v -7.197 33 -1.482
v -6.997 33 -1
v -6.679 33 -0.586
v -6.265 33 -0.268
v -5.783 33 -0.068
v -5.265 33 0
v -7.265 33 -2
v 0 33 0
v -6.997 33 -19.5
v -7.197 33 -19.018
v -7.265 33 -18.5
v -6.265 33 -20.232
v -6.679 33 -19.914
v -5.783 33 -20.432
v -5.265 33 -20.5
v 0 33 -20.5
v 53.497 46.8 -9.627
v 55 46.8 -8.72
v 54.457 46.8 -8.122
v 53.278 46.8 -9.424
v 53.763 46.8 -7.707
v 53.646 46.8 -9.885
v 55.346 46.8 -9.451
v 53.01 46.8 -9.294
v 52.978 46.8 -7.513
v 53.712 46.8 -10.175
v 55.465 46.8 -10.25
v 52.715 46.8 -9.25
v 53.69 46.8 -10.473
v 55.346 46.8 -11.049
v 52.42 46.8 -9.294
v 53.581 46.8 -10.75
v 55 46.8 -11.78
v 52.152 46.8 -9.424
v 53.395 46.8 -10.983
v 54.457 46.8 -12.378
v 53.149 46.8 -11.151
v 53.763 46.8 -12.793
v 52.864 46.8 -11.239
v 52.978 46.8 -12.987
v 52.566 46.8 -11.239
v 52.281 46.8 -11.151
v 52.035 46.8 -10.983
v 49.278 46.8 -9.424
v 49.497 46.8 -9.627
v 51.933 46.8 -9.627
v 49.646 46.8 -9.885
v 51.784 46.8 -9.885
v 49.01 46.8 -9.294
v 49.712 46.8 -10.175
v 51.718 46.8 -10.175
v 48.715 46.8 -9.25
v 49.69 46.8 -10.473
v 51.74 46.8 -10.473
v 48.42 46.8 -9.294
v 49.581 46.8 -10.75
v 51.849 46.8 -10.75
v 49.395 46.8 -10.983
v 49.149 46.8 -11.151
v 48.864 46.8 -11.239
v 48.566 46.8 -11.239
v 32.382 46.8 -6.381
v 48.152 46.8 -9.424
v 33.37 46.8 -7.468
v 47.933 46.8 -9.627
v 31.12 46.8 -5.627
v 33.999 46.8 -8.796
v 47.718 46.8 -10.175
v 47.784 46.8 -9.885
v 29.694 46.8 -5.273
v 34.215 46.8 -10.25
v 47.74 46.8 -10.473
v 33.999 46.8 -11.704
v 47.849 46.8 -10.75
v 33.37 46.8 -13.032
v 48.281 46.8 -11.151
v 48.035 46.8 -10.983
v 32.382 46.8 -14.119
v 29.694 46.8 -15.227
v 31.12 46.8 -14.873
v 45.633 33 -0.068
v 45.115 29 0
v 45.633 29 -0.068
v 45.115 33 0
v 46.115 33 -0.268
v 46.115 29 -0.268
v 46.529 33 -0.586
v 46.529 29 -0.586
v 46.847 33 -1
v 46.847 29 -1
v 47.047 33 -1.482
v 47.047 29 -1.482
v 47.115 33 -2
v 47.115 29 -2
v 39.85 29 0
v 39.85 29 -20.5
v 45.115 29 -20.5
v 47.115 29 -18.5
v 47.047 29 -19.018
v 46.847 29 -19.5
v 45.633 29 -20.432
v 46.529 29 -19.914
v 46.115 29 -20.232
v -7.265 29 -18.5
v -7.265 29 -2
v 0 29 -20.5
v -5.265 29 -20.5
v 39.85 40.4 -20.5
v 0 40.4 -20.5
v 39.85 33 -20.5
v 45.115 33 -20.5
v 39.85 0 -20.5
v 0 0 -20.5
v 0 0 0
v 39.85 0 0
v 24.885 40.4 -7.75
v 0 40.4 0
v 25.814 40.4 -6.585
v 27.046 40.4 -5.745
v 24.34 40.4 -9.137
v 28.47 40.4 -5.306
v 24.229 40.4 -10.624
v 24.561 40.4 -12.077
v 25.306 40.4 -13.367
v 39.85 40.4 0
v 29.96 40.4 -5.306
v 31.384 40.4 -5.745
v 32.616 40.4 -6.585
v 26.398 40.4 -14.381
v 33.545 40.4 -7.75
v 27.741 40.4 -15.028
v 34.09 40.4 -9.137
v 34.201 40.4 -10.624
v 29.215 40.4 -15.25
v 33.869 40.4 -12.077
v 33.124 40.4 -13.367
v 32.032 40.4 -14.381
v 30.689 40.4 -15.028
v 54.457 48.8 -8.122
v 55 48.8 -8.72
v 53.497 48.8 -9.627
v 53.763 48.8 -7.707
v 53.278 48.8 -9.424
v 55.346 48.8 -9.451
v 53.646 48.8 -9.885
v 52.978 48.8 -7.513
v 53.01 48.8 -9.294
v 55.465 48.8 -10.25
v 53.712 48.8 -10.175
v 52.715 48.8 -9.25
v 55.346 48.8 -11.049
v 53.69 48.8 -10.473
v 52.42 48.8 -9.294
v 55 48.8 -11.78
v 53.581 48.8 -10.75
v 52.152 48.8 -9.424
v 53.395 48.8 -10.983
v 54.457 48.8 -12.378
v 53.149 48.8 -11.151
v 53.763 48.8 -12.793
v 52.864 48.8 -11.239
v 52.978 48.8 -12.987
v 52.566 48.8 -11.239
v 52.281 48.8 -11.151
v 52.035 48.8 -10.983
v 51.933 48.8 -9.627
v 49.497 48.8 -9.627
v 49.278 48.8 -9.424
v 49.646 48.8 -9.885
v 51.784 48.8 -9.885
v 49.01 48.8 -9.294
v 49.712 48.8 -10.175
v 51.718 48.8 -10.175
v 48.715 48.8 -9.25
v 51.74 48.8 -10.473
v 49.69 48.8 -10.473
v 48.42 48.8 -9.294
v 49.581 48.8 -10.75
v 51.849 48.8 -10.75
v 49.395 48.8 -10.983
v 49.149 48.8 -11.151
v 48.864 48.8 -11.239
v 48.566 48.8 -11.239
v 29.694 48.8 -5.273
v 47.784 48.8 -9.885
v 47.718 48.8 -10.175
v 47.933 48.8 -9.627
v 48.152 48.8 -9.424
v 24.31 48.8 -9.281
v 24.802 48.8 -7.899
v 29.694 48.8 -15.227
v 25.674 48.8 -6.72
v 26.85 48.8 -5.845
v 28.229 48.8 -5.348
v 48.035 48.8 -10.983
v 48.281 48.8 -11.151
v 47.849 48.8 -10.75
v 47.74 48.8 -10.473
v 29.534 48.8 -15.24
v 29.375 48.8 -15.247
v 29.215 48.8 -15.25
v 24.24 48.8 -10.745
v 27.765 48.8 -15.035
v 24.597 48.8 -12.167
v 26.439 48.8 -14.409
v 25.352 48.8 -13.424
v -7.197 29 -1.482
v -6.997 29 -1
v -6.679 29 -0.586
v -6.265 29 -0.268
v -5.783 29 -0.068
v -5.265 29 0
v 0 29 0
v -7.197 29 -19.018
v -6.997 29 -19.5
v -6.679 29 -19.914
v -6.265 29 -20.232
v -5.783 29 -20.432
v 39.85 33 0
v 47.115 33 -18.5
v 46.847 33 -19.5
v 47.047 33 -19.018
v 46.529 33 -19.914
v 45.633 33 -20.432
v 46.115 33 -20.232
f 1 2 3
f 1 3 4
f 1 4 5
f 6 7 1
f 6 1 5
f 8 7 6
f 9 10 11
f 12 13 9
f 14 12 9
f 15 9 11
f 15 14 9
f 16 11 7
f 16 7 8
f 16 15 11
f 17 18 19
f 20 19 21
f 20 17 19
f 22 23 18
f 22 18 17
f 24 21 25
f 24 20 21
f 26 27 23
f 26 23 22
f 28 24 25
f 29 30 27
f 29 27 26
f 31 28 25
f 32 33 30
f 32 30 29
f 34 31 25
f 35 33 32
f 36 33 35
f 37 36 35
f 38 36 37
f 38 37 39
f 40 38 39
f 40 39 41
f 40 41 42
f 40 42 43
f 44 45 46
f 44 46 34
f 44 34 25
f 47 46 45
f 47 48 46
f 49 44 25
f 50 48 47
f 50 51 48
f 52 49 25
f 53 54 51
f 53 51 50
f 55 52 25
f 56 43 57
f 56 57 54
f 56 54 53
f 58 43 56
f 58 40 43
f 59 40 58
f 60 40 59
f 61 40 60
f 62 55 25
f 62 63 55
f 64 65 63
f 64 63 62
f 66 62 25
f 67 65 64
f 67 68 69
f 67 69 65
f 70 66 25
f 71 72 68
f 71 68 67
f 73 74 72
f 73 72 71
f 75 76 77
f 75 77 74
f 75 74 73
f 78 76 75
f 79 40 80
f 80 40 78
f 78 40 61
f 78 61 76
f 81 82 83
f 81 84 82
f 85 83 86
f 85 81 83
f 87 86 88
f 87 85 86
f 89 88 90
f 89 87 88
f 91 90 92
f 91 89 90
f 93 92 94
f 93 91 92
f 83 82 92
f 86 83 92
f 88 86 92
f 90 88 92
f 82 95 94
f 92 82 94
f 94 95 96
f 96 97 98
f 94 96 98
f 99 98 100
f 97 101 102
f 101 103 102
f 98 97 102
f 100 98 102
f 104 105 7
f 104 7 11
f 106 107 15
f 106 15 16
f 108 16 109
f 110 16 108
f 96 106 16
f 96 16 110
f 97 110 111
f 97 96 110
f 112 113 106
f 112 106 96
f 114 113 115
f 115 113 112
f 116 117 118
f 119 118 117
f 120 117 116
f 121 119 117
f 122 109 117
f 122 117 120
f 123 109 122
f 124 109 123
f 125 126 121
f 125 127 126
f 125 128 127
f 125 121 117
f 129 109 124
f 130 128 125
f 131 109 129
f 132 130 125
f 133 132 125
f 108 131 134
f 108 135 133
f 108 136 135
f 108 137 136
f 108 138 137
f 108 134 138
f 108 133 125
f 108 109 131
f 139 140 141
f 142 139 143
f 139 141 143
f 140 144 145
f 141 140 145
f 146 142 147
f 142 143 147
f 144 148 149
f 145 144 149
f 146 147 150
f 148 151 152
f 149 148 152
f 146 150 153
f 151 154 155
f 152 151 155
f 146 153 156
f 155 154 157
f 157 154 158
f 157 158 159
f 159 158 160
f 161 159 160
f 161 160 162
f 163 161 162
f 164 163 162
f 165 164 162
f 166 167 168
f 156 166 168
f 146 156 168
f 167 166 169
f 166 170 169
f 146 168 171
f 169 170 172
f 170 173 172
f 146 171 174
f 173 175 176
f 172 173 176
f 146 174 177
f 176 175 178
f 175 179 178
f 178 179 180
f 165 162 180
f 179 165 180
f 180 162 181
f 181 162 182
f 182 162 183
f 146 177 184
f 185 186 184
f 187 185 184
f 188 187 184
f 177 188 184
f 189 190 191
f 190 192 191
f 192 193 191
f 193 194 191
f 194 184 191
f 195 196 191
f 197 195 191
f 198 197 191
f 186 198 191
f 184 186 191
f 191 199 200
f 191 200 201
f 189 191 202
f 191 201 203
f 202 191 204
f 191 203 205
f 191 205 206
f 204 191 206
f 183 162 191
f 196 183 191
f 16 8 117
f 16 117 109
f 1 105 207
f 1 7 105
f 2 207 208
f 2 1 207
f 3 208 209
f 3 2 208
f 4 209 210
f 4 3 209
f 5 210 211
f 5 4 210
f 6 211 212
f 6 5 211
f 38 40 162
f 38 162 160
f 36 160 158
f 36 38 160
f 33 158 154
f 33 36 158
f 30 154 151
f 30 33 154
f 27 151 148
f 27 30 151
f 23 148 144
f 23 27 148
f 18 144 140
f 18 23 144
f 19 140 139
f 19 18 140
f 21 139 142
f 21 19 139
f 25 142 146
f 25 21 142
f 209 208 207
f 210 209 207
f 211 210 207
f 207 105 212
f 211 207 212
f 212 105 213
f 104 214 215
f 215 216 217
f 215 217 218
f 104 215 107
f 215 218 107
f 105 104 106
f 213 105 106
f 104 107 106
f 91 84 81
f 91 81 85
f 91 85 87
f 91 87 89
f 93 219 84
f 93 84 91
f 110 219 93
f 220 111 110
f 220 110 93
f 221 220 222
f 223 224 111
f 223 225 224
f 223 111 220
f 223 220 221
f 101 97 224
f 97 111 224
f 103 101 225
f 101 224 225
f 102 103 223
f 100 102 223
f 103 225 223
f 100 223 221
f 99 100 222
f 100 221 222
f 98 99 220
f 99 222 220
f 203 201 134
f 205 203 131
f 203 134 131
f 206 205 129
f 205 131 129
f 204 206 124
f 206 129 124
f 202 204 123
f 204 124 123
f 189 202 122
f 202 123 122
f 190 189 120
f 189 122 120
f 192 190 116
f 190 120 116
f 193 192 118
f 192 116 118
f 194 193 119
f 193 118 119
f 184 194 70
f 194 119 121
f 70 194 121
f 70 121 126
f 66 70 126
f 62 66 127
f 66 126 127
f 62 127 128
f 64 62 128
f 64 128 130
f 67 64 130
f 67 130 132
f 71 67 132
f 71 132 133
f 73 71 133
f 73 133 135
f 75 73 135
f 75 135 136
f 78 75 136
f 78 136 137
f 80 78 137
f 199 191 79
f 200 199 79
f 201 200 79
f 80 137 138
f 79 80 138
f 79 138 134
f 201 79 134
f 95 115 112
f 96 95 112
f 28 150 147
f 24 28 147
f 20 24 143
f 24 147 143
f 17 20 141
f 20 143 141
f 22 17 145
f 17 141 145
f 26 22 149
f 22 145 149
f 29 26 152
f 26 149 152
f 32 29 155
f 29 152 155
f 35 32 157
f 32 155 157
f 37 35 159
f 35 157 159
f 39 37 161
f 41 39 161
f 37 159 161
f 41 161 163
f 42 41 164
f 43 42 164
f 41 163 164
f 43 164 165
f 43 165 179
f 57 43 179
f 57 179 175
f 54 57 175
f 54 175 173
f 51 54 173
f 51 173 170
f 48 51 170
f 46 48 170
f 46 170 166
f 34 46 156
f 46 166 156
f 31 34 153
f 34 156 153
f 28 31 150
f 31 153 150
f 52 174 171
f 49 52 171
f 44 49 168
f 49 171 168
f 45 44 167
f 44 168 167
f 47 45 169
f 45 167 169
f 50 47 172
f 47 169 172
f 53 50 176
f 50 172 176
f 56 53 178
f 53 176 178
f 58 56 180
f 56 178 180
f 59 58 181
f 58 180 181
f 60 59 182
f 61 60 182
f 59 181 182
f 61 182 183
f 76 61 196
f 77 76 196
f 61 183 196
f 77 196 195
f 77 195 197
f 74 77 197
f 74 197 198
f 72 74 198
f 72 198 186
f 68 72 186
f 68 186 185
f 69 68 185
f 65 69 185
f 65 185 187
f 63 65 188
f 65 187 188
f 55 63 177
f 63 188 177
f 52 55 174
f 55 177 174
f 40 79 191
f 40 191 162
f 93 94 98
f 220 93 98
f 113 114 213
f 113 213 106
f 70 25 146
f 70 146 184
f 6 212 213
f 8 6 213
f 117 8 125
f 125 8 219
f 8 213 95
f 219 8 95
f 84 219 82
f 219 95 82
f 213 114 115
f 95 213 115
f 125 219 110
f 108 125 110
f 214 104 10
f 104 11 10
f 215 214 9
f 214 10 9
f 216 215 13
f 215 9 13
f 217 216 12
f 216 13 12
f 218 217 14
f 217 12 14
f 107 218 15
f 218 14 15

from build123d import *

# Parameters (mm, degrees)
SKETCH2_W           = 39.85
SKETCH2_H           = 20.5
BOSS_EXTRUDE1_DEPTH = 40.4
BOSS_EXTRUDE2_START = 29
SKETCH3_W           = 54.38
SKETCH3_H           = 20.5
BOSS_EXTRUDE2_DEPTH = 4
FILLET1_R           = 2
SKETCH5_R           = 5
BOSS_EXTRUDE3_DEPTH = 8.4
BOSS_EXTRUDE4_START = -2
BOSS_EXTRUDE4_DEPTH = 2
SKETCH7_R           = 1
CUT_EXTRUDE1_DEPTH  = 2


with BuildPart() as part:
    # Sketch2 → Boss-Extrude1 (new body)
    with BuildSketch(Plane(origin=(0, 0, 0), x_dir=(1, 0, 0), z_dir=(0, 1, 0))):
        with Locations((19.925, 10.25)):
            Rectangle(SKETCH2_W, SKETCH2_H)
    extrude(amount=BOSS_EXTRUDE1_DEPTH)

    # Sketch3 → Boss-Extrude2 (add)
    with BuildSketch(Plane(origin=(0, 0, 0), x_dir=(1, 0, 0), z_dir=(0, 1, 0)).offset(BOSS_EXTRUDE2_START)):
        with Locations((19.925, 10.25)):
            Rectangle(SKETCH3_W, SKETCH3_H)
    extrude(amount=BOSS_EXTRUDE2_DEPTH)

    # Fillet1
    fillet1_edges = [part.edges().sort_by_distance(p)[0] for p in [
        (-7.265, 31, 0),
        (47.115, 31, -20.5),
        (-7.265, 31, -20.5),
        (47.115, 31, 0),
    ]]
    fillet(fillet1_edges, radius=FILLET1_R)

    # Sketch5 → Boss-Extrude3 (add)
    with BuildSketch(Plane(origin=(0, 40.4, 0), x_dir=(1, 0, 0), z_dir=(0, 1, 0))):
        with Locations(Location((29.215, 10.25, 0), (0, 0, 90))):
            Circle(SKETCH5_R)
    extrude(amount=BOSS_EXTRUDE3_DEPTH)

    # Sketch6 → Boss-Extrude4 (add)
    with BuildSketch(Plane(origin=(0, 48.8, 0), x_dir=(1, 0, 0), z_dir=(0, 1, 0)).offset(BOSS_EXTRUDE4_START)):
        with BuildLine():
            Line((29.693723404, 15.227029626), (52.978297872, 12.987366295))
            ThreePointArc((52.978297872, 12.987366295), (55.465, 10.25), (52.978297872, 7.512633705))
            Line((52.978297872, 7.512633705), (29.693723404, 5.272970374))
            ThreePointArc((29.693723404, 5.272970374), (24.215, 10.25), (29.693723404, 15.227029626))
        make_face()
    extrude(amount=BOSS_EXTRUDE4_DEPTH)

    # Sketch7 → Cut-Extrude1 (cut)
    with BuildSketch(Plane(origin=(0, 48.8, 0), x_dir=(1, 0, 0), z_dir=(0, 1, 0))):
        with Locations(Location((52.715, 10.25, 0), (0, 0, 270))):
            Circle(SKETCH7_R)
        with Locations(Location((48.715, 10.25, 0), (0, 0, 270))):
            Circle(SKETCH7_R)
    extrude(amount=-CUT_EXTRUDE1_DEPTH, mode=Mode.SUBTRACT)


solid = part.part
